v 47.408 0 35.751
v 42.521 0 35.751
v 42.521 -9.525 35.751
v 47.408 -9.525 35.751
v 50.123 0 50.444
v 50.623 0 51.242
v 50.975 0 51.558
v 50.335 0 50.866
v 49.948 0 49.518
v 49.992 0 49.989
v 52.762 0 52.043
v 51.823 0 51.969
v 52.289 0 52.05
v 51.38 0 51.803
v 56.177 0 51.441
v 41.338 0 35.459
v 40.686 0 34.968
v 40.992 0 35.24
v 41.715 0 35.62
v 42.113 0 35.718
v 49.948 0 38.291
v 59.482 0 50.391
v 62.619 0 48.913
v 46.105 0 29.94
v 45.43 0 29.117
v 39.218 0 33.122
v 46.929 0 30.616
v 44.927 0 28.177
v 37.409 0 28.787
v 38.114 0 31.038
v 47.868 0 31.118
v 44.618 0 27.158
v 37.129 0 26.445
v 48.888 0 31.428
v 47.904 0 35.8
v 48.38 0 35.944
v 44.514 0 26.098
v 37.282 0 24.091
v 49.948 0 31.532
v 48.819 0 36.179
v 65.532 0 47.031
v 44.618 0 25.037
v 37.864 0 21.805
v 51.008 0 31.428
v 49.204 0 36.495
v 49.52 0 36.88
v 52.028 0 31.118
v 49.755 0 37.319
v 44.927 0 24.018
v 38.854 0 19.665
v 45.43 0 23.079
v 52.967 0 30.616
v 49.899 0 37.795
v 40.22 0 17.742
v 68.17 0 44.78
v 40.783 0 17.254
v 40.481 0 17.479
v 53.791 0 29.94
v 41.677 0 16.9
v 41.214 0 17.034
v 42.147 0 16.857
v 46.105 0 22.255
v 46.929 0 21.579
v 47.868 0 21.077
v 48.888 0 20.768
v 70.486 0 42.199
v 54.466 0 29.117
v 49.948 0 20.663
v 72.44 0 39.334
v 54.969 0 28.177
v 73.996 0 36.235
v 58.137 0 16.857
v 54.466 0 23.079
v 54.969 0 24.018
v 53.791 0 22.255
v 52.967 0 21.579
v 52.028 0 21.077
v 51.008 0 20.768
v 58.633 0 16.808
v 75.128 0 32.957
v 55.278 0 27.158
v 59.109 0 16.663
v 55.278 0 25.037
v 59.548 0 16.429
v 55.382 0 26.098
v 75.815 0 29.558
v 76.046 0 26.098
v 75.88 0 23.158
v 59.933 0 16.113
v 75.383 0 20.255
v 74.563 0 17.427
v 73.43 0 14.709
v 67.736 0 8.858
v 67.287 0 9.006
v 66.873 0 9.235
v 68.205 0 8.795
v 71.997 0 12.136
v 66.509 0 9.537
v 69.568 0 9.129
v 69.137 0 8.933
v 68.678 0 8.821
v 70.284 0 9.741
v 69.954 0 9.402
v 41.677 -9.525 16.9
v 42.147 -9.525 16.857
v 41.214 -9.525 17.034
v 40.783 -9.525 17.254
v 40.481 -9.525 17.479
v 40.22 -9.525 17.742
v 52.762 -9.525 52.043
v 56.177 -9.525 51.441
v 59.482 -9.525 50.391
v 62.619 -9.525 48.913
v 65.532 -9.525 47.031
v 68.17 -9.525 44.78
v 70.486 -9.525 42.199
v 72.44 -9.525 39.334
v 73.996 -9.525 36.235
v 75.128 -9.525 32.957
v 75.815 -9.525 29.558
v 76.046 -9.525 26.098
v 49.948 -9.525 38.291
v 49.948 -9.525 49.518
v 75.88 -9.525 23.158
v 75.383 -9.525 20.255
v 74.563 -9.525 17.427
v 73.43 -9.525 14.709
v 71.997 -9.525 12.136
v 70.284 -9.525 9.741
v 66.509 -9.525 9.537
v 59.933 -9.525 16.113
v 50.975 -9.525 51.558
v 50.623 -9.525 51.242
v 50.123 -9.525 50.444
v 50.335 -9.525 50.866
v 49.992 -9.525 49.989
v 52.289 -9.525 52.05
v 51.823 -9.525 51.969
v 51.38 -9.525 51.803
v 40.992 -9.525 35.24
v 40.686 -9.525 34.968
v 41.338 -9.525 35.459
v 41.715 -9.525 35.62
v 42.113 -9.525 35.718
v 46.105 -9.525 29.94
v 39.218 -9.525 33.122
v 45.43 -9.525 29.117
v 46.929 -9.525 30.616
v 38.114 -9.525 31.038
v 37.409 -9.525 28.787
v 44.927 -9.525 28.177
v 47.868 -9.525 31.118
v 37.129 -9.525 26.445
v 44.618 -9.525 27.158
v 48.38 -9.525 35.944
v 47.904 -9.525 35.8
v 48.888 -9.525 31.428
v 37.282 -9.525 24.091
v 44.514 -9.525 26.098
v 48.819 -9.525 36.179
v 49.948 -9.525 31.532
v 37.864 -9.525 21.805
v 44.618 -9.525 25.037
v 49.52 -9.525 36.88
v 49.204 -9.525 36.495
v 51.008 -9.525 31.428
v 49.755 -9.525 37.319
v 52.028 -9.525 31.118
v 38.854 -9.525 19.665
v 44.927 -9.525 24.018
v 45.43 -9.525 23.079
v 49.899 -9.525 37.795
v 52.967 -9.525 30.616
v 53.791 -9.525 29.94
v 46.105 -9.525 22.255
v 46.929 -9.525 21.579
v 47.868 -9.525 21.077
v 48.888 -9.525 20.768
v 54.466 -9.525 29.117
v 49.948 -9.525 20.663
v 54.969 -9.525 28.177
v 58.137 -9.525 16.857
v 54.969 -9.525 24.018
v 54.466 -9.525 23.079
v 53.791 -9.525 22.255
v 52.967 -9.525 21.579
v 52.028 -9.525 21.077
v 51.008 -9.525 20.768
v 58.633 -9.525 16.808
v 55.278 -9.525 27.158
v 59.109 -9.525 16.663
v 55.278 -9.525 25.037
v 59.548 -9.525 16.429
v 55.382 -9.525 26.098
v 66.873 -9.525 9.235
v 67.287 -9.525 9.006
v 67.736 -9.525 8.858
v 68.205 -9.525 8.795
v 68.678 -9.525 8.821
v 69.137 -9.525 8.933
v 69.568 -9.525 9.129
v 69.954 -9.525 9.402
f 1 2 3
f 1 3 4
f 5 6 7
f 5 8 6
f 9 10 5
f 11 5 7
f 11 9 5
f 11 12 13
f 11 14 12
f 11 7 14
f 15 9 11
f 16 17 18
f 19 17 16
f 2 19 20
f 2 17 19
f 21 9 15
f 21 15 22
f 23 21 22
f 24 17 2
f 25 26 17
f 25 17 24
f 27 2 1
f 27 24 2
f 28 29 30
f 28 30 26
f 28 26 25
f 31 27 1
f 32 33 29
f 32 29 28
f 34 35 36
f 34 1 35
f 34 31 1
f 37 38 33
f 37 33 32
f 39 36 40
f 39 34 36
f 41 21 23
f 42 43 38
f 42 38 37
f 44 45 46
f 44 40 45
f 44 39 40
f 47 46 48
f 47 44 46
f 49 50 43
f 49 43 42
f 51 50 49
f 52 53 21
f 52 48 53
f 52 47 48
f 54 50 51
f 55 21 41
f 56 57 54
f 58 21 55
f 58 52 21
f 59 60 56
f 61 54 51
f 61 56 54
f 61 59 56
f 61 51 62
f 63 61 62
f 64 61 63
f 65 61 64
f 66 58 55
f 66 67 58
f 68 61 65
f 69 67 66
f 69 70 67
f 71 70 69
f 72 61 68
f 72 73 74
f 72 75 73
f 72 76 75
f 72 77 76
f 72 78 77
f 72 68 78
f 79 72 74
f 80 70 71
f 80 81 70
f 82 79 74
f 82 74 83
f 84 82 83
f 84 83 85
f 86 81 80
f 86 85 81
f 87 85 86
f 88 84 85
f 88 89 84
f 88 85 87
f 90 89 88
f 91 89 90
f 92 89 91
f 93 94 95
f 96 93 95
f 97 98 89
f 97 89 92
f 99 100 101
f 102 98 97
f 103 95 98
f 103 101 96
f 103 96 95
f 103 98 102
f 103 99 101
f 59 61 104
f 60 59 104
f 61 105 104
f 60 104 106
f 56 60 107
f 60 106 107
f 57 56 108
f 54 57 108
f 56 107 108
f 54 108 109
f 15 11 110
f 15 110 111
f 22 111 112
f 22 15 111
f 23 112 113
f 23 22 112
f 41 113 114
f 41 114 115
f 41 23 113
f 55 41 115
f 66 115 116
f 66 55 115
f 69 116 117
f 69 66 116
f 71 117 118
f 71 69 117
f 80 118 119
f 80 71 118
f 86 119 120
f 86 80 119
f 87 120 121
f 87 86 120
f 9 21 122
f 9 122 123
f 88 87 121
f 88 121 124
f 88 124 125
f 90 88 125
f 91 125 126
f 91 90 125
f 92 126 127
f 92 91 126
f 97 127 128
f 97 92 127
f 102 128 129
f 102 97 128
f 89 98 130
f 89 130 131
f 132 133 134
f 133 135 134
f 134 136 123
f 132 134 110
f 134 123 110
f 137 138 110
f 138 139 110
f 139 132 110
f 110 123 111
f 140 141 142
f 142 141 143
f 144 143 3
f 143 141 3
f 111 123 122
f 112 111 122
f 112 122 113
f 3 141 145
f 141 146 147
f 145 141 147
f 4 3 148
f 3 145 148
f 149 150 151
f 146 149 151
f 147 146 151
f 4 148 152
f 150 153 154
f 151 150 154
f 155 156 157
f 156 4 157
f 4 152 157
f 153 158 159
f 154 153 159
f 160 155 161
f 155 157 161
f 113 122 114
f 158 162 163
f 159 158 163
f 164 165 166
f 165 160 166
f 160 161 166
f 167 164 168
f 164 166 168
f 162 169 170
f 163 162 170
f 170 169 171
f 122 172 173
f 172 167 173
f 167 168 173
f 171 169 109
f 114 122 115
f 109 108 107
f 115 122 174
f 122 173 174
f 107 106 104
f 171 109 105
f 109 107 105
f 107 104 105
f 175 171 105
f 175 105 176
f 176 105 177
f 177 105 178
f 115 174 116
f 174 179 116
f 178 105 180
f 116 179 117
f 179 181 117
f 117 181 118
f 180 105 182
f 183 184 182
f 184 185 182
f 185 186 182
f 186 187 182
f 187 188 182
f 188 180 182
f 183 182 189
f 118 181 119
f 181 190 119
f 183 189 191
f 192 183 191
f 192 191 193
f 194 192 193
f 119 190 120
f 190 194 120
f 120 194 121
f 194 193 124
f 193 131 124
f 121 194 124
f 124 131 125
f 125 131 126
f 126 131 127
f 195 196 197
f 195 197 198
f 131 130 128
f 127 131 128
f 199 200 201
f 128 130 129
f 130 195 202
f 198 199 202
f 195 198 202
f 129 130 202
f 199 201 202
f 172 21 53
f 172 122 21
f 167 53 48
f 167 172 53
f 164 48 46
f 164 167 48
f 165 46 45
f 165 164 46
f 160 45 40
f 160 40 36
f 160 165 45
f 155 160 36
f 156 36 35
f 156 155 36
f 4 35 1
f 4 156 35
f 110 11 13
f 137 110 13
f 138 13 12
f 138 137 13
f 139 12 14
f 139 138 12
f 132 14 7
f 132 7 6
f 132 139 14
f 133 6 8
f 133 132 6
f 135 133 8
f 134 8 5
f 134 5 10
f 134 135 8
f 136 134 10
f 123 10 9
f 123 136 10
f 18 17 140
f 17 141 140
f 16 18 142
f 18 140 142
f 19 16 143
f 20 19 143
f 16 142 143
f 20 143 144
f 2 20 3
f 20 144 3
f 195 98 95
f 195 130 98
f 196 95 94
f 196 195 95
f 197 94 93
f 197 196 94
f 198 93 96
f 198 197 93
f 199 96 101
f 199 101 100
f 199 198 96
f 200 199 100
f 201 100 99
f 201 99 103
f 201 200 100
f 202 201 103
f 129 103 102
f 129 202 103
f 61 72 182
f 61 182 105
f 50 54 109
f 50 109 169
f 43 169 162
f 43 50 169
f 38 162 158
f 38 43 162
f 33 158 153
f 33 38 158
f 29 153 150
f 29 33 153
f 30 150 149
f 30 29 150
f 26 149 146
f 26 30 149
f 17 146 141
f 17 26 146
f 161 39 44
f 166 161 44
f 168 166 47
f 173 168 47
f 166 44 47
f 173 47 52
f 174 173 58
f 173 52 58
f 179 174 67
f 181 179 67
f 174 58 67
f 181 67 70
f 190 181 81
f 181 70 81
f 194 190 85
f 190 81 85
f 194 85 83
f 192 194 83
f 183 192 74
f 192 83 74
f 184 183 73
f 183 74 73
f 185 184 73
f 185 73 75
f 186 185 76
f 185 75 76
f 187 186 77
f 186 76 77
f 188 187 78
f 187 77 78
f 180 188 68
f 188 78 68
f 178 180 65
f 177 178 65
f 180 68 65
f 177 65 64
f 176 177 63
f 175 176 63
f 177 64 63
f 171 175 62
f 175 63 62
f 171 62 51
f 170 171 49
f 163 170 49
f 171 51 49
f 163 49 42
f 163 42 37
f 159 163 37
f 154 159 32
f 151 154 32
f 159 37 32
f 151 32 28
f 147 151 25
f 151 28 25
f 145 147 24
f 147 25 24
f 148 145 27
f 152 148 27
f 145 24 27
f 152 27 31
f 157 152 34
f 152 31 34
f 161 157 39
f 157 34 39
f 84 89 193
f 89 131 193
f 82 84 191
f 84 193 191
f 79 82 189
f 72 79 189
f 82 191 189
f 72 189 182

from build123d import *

# Parameters (mm, degrees)
SKETCH11_R     = 5.434276133
EXTRUDE5_DEPTH = 9.525
FILLET2_R      = 2.54
FILLET1_R      = 2.54
FILLET3_R      = 2.54


with BuildPart() as part:
    # Sketch11 → Extrude5 (new body)
    # profile 1 of 4: a face of its own
    with BuildSketch(Plane(origin=(0, 0, 0), x_dir=(1, 0, 0), z_dir=(0, 1, 0))):
        with BuildLine():
            Line((68.401879092, -7.643838899), (59.189110378, -16.856607613))
            Line((59.189110378, -16.856607613), (41.505666101, -16.856607613))
            ThreePointArc((41.505666101, -16.856607613), (41.271917597, -16.860911304), (41.038485938, -16.873816546))
            ThreePointArc((41.038485938, -16.873816546), (37.127788442, -26.414950032), (41.505666101, -35.750954012))
            Line((41.505666101, -35.750954012), (49.948049738, -35.750954012))
            Line((49.948049738, -35.750954012), (49.948049738, -52.195324003))
            ThreePointArc((49.948049738, -52.195324003), (68.401879092, -44.551497607), (76.045705488, -26.097668253))
            ThreePointArc((76.045705488, -26.097668253), (74.059139732, -16.110527774), (68.401879092, -7.643838899))
        make_face()
        with Locations(Location((49.948049738, -26.097668253, 0), (0, 0, 270))):
            Circle(SKETCH11_R, mode=Mode.SUBTRACT)
    # profile 2 of 4: a face of its own
    with BuildSketch(Plane(origin=(0, 0, 0), x_dir=(1, 0, 0), z_dir=(0, 1, 0))):
        with BuildLine():
            Line((68.401879092, -7.643838899), (59.189110378, -16.856607613))
            Line((59.189110378, -16.856607613), (41.505666101, -16.856607613))
            ThreePointArc((41.505666101, -16.856607613), (41.271917597, -16.860911304), (41.038485938, -16.873816546))
            ThreePointArc((41.038485938, -16.873816546), (37.127788442, -26.414950032), (41.505666101, -35.750954012))
            Line((41.505666101, -35.750954012), (49.948049738, -35.750954012))
            Line((49.948049738, -35.750954012), (49.948049738, -52.195324003))
            ThreePointArc((49.948049738, -52.195324003), (68.401879092, -44.551497607), (76.045705488, -26.097668253))
            ThreePointArc((76.045705488, -26.097668253), (74.059139732, -16.110527774), (68.401879092, -7.643838899))
        make_face()
        with Locations(Location((49.948049738, -26.097668253, 0), (0, 0, 270))):
            Circle(SKETCH11_R, mode=Mode.SUBTRACT)
    # profile 3 of 4: a face of its own
    with BuildSketch(Plane(origin=(0, 0, 0), x_dir=(1, 0, 0), z_dir=(0, 1, 0))):
        with BuildLine():
            Line((68.401879092, -7.643838899), (59.189110378, -16.856607613))
            Line((59.189110378, -16.856607613), (41.505666101, -16.856607613))
            ThreePointArc((41.505666101, -16.856607613), (41.271917597, -16.860911304), (41.038485938, -16.873816546))
            ThreePointArc((41.038485938, -16.873816546), (37.127788442, -26.414950032), (41.505666101, -35.750954012))
            Line((41.505666101, -35.750954012), (49.948049738, -35.750954012))
            Line((49.948049738, -35.750954012), (49.948049738, -52.195324003))
            ThreePointArc((49.948049738, -52.195324003), (68.401879092, -44.551497607), (76.045705488, -26.097668253))
            ThreePointArc((76.045705488, -26.097668253), (74.059139732, -16.110527774), (68.401879092, -7.643838899))
        make_face()
        with Locations(Location((49.948049738, -26.097668253, 0), (0, 0, 270))):
            Circle(SKETCH11_R, mode=Mode.SUBTRACT)
    # profile 4 of 4: a face of its own
    with BuildSketch(Plane(origin=(0, 0, 0), x_dir=(1, 0, 0), z_dir=(0, 1, 0))):
        with BuildLine():
            Line((68.401879092, -7.643838899), (59.189110378, -16.856607613))
            Line((59.189110378, -16.856607613), (41.505666101, -16.856607613))
            ThreePointArc((41.505666101, -16.856607613), (41.271917597, -16.860911304), (41.038485938, -16.873816546))
            ThreePointArc((41.038485938, -16.873816546), (37.127788442, -26.414950032), (41.505666101, -35.750954012))
            Line((41.505666101, -35.750954012), (49.948049738, -35.750954012))
            Line((49.948049738, -35.750954012), (49.948049738, -52.195324003))
            ThreePointArc((49.948049738, -52.195324003), (68.401879092, -44.551497607), (76.045705488, -26.097668253))
            ThreePointArc((76.045705488, -26.097668253), (74.059139732, -16.110527774), (68.401879092, -7.643838899))
        make_face()
        with Locations(Location((49.948049738, -26.097668253, 0), (0, 0, 270))):
            Circle(SKETCH11_R, mode=Mode.SUBTRACT)
    extrude(amount=-EXTRUDE5_DEPTH)

    # Fillet2
    fillet2_edges = [part.edges().sort_by_distance(p)[0] for p in [
        (59.189110378, -4.7625, 16.856607613),
        (49.948049738, -4.7625, 35.750954012),
    ]]
    fillet(fillet2_edges, radius=FILLET2_R)

    # Fillet1
    fillet1_edges = [part.edges().sort_by_distance(p)[0] for p in [
        (68.401879092, -4.7625, 7.643838899),
        (49.948049738, -4.7625, 52.195324003),
    ]]
    fillet(fillet1_edges, radius=FILLET1_R)

    # Fillet3
    fillet3_edges = [part.edges().sort_by_distance(p)[0] for p in [
        (41.038485938, -4.7625, 16.873816546),
        (41.505666101, -4.7625, 35.750954012),
    ]]
    fillet(fillet3_edges, radius=FILLET3_R)


solid = part.part
